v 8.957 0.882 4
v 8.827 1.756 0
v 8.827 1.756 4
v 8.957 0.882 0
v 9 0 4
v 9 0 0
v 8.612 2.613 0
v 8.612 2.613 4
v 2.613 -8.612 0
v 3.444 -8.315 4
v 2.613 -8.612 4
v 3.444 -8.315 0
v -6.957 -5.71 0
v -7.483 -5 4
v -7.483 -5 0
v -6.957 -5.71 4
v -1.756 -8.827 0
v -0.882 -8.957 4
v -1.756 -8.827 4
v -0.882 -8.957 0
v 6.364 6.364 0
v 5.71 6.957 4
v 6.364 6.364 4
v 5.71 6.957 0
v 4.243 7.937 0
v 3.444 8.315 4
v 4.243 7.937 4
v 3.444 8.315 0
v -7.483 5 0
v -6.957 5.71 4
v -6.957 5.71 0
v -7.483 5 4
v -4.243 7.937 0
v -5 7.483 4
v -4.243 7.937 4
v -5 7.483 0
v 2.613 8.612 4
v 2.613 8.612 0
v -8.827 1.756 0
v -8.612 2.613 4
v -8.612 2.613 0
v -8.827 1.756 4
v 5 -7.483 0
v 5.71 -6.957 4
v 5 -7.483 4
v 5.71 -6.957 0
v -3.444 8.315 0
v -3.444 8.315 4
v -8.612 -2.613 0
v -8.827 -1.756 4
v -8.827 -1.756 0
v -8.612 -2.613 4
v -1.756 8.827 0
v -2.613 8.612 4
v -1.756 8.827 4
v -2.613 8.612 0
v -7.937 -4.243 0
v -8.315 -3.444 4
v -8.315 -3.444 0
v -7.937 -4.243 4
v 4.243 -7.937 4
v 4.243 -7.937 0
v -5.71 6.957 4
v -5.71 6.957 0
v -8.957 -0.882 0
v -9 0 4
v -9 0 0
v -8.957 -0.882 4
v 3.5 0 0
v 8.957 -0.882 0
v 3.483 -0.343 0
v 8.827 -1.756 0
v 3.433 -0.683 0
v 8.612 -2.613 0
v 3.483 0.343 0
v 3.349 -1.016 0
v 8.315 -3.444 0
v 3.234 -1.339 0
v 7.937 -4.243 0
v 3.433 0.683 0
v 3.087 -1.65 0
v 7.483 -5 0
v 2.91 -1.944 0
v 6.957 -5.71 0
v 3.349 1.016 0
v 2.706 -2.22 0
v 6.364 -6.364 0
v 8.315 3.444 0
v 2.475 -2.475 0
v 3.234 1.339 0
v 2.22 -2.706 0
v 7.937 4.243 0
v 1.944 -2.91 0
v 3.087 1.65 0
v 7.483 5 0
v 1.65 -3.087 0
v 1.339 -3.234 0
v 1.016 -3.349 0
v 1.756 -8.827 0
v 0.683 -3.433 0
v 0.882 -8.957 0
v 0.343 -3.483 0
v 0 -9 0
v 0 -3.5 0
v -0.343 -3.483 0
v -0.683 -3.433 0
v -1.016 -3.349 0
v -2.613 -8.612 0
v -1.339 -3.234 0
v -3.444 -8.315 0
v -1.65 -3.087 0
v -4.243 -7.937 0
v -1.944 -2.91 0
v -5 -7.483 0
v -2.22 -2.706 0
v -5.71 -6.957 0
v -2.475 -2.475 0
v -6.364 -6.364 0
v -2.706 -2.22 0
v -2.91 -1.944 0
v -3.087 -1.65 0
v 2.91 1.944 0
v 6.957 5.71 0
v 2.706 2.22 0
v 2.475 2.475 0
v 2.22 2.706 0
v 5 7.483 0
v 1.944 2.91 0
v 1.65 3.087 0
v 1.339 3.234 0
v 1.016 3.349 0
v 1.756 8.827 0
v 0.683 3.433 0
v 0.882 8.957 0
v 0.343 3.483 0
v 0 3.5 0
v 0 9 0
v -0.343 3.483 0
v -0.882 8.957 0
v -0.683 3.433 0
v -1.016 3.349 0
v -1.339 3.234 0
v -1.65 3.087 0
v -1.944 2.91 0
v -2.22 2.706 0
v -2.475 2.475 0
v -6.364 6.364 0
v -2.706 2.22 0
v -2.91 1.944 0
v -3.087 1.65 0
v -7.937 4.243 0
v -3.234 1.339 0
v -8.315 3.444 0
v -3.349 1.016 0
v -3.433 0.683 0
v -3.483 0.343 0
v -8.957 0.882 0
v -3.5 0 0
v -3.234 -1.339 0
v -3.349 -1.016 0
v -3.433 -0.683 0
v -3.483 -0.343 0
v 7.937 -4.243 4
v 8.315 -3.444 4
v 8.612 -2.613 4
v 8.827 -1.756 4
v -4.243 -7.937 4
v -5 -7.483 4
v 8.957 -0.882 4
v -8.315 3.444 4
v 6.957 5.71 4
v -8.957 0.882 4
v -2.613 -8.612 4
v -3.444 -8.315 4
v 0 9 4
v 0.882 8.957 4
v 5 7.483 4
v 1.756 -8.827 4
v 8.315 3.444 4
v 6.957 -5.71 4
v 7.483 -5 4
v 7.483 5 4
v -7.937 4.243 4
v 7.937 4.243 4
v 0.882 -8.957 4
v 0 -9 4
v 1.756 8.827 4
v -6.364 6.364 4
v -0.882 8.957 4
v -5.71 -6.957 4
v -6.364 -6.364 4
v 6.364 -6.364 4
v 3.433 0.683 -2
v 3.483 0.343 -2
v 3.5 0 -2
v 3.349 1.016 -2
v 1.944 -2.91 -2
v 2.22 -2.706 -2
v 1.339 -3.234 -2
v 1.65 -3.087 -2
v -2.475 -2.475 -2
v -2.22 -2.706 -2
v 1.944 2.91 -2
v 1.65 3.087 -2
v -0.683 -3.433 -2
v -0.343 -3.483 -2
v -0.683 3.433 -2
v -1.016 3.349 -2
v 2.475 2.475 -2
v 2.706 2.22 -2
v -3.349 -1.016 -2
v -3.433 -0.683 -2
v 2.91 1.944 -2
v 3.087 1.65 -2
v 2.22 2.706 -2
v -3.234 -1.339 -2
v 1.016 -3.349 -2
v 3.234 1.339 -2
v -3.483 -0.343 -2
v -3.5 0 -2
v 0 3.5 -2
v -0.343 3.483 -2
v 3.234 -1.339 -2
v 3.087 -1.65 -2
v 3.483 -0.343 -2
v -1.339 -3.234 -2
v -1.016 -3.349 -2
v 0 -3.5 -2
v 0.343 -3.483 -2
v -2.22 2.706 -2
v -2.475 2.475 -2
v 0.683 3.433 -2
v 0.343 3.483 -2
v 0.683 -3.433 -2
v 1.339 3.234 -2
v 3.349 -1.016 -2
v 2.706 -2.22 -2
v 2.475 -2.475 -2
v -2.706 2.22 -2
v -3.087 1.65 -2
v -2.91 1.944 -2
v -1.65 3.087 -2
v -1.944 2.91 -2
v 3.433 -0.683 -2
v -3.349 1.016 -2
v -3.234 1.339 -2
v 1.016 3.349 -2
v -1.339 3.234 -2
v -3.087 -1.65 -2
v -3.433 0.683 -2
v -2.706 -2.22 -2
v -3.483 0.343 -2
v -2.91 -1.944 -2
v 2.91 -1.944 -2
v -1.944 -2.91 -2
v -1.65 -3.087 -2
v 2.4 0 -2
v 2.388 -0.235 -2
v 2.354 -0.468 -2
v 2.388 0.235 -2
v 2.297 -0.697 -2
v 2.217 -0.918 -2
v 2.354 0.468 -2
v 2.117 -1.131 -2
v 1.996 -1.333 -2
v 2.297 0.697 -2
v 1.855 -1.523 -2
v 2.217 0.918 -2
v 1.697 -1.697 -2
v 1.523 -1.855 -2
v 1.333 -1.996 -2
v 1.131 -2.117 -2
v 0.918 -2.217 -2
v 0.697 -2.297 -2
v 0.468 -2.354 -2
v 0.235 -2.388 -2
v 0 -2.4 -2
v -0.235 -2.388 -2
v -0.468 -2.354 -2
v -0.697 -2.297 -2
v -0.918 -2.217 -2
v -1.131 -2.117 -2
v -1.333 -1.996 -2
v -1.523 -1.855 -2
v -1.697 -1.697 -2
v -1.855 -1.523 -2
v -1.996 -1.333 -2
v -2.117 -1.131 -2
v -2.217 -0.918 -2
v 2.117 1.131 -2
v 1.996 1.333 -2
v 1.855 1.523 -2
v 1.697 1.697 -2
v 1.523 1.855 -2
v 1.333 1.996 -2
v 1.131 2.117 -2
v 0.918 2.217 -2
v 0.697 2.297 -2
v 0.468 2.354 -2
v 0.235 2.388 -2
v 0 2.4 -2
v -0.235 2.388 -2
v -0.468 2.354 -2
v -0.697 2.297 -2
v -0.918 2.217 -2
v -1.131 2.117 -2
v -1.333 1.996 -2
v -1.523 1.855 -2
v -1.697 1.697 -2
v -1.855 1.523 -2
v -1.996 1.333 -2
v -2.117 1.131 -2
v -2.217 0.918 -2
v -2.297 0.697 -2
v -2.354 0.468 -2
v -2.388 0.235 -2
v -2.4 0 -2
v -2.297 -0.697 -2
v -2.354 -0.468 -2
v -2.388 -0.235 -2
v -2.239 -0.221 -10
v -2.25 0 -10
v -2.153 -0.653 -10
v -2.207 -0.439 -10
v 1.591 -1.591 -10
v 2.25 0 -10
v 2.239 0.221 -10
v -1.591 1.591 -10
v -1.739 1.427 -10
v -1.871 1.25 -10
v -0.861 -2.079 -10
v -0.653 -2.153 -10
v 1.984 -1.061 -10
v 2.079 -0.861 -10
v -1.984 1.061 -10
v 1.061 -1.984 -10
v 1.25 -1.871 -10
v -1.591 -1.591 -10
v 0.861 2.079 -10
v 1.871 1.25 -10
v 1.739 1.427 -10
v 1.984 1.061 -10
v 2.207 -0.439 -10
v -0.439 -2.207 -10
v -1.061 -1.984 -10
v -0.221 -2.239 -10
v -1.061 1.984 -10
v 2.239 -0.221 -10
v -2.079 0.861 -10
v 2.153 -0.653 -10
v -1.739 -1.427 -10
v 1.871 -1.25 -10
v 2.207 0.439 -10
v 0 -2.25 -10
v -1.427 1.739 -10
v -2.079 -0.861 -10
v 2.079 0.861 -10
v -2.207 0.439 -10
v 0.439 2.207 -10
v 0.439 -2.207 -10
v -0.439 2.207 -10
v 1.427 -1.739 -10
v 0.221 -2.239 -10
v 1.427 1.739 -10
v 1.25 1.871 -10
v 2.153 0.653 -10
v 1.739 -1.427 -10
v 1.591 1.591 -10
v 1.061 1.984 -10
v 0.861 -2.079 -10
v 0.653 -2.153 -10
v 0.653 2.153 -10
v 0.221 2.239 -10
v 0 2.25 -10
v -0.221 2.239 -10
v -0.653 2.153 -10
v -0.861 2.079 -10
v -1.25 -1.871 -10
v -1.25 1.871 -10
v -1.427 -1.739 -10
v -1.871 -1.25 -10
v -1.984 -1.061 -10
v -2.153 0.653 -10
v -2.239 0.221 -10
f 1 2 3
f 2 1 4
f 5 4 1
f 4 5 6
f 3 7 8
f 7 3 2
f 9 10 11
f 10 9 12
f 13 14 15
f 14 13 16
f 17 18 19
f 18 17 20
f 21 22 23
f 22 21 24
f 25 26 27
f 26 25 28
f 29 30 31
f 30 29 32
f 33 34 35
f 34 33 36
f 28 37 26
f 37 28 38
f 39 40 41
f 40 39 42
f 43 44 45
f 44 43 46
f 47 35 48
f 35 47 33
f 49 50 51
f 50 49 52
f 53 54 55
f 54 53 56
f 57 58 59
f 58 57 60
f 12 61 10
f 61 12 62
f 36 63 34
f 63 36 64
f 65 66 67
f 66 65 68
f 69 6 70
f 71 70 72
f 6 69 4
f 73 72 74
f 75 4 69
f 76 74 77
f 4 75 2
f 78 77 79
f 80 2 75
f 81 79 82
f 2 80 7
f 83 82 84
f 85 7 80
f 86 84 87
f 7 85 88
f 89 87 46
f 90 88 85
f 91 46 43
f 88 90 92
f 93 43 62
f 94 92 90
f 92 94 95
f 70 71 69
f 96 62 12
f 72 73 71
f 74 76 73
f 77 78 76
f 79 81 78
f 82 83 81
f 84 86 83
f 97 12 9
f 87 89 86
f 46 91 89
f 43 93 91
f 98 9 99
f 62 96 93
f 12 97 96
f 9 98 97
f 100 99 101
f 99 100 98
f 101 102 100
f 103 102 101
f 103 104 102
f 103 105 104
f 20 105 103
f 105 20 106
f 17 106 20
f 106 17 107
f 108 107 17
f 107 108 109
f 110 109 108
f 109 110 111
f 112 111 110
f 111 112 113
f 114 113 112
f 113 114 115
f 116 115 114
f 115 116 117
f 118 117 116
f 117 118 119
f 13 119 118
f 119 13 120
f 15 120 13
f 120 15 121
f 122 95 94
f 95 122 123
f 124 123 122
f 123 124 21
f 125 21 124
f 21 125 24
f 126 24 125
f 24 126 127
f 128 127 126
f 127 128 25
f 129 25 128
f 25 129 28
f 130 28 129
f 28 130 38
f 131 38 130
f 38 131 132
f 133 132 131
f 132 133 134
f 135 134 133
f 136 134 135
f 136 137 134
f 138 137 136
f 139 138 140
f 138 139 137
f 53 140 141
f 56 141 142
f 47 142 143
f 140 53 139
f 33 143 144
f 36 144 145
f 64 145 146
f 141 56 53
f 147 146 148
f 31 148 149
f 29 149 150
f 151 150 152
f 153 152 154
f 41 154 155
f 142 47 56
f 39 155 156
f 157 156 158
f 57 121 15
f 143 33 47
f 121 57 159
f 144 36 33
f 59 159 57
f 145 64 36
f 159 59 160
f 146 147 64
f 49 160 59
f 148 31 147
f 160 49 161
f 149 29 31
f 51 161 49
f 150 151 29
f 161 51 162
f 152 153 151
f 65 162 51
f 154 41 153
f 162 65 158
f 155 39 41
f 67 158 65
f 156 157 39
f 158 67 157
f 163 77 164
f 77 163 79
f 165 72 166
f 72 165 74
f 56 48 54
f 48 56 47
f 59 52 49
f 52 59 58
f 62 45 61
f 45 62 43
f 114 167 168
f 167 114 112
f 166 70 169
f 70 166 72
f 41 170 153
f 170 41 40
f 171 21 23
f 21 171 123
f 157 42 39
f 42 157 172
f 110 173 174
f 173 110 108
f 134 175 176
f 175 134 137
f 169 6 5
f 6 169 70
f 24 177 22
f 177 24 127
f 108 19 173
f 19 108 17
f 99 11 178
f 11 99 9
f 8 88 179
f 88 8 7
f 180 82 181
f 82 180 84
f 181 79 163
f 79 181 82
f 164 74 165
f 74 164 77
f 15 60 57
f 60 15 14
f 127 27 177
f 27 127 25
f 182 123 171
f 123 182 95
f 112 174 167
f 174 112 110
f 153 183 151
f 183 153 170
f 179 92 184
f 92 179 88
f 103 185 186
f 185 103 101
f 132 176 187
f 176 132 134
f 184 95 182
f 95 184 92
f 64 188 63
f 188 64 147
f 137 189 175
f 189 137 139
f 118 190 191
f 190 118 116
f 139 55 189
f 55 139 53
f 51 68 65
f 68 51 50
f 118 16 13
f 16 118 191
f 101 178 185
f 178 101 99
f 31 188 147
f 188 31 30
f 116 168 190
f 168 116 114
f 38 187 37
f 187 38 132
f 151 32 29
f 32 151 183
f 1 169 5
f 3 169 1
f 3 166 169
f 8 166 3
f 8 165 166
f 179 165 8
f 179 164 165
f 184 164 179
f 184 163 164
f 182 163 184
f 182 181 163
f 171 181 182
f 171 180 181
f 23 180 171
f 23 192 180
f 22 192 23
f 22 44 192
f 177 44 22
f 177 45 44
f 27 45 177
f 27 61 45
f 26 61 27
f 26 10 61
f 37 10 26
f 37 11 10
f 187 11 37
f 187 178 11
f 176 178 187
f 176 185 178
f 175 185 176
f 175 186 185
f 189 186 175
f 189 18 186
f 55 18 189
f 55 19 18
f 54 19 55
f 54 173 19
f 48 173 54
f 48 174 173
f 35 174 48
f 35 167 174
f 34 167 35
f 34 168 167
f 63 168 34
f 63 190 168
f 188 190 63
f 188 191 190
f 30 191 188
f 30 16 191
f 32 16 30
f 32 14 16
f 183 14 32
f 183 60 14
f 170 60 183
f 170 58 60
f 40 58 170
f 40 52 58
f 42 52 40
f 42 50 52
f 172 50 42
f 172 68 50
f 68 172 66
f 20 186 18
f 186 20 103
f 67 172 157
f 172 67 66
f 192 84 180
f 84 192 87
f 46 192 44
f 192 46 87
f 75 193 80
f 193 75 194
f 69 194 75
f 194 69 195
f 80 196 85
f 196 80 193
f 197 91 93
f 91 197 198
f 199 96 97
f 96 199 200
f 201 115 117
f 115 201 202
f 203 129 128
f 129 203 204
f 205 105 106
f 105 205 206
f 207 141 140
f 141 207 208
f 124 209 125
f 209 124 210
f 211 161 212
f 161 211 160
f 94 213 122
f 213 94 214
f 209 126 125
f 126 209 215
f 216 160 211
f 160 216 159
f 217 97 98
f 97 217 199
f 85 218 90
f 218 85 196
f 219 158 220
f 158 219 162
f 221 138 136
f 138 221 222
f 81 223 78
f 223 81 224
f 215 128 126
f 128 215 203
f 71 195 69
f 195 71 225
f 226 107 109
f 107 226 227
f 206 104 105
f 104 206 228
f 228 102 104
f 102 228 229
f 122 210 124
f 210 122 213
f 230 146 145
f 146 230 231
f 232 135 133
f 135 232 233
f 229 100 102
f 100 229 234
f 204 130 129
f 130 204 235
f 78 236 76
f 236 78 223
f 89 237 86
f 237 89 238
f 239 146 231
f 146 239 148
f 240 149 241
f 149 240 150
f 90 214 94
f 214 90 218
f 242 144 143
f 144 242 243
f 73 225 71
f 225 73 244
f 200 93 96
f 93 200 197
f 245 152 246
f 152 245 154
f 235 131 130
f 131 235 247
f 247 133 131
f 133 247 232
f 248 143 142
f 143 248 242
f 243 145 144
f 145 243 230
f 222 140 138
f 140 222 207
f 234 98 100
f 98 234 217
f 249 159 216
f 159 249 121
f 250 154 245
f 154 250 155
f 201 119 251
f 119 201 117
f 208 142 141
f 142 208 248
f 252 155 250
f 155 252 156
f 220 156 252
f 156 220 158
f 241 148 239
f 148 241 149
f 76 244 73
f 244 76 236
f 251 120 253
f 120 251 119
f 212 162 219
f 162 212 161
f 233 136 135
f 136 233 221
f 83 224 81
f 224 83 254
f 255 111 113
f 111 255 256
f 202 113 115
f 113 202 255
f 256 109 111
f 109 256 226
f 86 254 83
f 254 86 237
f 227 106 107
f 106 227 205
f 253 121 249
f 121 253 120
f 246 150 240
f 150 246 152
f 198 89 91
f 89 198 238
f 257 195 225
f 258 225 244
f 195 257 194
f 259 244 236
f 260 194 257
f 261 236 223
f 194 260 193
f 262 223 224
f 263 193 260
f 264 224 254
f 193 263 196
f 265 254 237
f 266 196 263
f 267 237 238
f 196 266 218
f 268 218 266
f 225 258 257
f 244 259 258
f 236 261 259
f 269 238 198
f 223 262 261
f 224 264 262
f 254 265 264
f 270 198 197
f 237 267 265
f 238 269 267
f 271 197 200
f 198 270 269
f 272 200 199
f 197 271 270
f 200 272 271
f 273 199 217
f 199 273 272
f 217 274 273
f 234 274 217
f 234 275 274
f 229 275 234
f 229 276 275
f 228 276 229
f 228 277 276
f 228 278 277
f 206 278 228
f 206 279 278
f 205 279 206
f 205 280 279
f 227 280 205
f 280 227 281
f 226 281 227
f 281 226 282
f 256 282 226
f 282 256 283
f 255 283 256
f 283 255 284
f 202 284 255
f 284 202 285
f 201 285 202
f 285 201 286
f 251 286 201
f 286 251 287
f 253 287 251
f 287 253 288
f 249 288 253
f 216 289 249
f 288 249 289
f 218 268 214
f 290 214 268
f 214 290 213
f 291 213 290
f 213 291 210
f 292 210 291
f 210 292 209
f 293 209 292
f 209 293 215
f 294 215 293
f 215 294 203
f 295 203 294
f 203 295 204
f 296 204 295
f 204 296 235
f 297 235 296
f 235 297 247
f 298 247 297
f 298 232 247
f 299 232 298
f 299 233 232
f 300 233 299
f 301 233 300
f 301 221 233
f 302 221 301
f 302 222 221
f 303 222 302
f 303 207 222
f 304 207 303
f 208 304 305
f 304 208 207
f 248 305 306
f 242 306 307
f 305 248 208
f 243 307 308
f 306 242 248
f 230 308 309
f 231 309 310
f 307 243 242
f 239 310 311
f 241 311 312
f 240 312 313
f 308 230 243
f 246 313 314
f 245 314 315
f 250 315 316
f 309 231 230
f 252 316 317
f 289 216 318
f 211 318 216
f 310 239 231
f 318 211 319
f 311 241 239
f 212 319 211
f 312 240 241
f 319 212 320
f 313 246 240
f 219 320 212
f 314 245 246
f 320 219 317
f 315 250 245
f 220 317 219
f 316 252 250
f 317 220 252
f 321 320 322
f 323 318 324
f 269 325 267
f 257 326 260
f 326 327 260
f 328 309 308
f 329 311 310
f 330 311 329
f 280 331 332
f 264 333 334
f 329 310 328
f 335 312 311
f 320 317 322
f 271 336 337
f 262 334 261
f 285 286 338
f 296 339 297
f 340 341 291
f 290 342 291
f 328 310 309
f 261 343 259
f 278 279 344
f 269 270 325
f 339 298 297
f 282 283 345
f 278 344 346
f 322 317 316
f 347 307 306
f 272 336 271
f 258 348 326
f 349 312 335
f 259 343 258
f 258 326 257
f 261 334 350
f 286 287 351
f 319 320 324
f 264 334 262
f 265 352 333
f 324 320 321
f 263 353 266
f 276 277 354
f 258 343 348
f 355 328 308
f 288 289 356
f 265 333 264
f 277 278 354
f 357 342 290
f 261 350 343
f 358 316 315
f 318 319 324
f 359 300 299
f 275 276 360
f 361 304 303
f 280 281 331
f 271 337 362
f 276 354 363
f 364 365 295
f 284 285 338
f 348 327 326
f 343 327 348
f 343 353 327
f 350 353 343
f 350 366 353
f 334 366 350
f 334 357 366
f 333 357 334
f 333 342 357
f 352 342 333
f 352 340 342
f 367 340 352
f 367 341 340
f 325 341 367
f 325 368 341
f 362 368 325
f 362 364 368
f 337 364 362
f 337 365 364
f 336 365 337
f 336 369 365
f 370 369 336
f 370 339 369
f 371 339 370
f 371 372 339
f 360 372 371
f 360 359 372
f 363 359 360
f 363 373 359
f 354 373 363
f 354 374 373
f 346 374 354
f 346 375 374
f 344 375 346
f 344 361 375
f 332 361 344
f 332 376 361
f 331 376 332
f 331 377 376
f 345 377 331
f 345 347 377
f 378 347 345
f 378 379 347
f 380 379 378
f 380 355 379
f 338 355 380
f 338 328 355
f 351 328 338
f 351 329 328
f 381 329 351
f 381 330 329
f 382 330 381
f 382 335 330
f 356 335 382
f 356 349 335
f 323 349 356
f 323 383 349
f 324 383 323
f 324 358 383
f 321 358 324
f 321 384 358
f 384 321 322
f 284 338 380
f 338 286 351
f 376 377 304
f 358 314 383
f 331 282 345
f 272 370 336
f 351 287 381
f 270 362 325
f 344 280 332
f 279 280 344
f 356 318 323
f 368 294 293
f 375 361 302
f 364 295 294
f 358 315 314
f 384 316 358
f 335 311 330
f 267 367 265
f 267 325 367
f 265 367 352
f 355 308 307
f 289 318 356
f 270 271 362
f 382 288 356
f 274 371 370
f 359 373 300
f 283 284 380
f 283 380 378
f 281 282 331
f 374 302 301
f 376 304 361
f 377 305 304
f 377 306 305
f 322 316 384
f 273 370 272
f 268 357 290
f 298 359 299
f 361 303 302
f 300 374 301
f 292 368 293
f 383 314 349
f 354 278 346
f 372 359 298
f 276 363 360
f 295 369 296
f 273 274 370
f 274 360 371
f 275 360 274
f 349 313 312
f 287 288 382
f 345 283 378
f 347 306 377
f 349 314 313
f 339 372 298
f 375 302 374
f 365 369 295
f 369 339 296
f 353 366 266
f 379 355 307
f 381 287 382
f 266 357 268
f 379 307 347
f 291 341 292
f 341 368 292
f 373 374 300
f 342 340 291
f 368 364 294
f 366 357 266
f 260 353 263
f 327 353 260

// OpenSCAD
// Simple puller for 5 mm hole

hole_d       = 5;      // hole diameter in plate
clearance    = 0.2;    // tweak depending on your printer
shaft_len    = 8;      // how deep the pin goes in
shaft_taper  = 0.3;    // extra at the bottom so it wedges a bit
handle_d     = 18;     // top disc diameter
handle_h     = 4;      // thickness of the top disc
neck_h       = 2;      // neck height under the handle

$fn = 64;

module puller() {
    union() {
        // Handle disc
        cylinder(h = handle_h, d = handle_d);

        // Neck (so fingers can grab under the handle)
        translate([0,0,-neck_h])
            cylinder(h = neck_h, d = hole_d + 2);  // a bit thicker than the hole

        // Tapered shaft (friction fit in the 5 mm hole)
        translate([0,0,-neck_h - shaft_len])
            cylinder(h = shaft_len,
                     d1 = hole_d - clearance - shaft_taper,   // tip slightly smaller
                     d2 = hole_d - clearance);                // near handle slightly larger
    }
}

puller();
